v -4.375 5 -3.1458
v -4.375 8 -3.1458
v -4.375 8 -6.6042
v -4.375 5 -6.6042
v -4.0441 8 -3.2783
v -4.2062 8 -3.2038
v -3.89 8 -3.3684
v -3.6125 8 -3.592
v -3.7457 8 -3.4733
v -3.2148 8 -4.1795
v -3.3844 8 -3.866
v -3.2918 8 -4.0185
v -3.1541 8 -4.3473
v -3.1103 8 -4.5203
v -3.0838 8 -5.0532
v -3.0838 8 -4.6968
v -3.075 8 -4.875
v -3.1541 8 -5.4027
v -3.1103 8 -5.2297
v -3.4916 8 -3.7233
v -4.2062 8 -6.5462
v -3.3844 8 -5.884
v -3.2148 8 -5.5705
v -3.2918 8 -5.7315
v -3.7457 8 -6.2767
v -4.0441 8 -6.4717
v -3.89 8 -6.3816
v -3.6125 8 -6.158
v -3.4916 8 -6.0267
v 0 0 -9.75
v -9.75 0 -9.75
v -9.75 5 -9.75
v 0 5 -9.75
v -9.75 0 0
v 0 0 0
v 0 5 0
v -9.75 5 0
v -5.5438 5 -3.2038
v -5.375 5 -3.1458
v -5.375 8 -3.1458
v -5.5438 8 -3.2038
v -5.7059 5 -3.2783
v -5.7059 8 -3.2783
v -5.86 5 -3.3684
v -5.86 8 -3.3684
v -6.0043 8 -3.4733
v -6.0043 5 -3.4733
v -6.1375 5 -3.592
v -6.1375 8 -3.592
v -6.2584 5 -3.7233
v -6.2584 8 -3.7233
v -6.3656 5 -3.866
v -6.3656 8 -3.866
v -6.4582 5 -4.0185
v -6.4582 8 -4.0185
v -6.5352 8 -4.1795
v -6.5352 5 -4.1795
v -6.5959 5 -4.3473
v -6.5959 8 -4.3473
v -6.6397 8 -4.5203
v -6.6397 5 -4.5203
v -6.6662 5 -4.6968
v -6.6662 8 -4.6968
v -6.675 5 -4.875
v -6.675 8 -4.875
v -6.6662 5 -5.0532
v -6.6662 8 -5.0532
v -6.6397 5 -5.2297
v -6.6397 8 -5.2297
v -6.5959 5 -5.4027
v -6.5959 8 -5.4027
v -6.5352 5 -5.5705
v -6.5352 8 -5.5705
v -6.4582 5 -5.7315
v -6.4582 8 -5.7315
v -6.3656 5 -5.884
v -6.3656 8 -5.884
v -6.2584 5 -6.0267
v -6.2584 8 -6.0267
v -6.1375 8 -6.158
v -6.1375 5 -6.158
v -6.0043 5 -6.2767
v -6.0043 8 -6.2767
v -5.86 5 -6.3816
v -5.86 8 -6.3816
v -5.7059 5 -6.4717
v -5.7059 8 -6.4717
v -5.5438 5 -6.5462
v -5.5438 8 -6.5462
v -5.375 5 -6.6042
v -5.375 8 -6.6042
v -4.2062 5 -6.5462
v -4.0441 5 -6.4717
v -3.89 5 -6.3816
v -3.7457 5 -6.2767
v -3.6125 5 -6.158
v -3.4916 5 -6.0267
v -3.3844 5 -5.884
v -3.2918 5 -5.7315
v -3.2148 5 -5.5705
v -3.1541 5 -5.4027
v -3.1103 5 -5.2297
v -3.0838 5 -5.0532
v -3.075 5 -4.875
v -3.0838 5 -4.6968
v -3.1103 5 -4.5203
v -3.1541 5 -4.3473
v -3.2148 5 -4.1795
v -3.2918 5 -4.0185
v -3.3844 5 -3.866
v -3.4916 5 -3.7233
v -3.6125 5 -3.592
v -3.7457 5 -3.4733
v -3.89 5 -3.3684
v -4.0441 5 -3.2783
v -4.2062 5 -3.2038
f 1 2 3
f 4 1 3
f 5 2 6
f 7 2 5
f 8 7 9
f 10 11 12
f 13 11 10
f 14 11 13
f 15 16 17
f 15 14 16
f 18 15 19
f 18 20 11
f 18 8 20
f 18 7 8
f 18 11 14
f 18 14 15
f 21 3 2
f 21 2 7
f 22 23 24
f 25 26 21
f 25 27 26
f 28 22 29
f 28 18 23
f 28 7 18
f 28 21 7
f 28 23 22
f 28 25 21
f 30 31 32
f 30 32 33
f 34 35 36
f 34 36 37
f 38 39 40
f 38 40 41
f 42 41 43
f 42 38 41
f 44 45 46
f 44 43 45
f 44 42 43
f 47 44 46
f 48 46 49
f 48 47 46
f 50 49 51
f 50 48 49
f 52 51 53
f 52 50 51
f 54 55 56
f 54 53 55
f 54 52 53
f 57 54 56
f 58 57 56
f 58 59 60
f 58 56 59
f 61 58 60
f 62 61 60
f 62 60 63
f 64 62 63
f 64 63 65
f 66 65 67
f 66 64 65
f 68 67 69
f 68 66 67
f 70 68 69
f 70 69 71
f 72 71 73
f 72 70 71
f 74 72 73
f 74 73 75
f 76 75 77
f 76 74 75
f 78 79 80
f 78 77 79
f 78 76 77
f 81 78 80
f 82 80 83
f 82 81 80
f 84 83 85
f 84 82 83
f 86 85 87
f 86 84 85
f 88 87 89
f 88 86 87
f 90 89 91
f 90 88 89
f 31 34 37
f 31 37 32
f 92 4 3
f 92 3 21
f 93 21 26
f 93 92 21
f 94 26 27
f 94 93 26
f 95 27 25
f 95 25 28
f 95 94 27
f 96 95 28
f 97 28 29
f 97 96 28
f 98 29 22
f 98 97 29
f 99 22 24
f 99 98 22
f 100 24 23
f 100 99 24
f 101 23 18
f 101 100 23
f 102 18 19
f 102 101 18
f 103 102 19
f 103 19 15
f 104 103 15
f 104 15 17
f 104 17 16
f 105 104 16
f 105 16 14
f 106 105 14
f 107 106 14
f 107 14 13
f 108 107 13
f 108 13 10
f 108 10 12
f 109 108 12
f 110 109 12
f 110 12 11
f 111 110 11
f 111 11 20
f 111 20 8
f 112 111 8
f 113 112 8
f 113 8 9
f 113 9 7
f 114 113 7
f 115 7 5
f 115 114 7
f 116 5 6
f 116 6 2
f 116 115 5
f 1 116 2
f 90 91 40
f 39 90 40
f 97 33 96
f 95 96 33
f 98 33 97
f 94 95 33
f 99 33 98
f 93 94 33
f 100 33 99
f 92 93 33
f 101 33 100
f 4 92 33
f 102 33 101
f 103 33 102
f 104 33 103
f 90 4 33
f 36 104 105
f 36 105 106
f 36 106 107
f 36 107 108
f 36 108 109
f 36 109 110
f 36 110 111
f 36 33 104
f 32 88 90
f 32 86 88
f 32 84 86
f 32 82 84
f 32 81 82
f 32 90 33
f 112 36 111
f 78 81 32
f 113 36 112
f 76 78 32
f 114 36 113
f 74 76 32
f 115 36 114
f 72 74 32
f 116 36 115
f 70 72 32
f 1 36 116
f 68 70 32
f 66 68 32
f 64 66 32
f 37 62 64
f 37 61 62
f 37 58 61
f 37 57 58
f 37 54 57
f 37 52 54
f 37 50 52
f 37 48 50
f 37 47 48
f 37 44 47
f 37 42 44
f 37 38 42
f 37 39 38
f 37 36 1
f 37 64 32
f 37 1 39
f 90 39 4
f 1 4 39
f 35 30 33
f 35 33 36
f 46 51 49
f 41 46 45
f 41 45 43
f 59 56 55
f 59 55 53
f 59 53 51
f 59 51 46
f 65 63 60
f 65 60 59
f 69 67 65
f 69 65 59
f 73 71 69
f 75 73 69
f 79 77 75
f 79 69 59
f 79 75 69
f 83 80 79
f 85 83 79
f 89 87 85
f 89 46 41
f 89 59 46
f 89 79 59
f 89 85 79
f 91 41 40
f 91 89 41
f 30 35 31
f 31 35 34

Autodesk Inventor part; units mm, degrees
ref_plane "YZ Plane" through (0, 0, 0) normal (1, 0, 0) x (0, 1, 0)
ref_plane "XZ Plane" through (0, 0, 0) normal (0, 1, 0) x (-1, 0, 0)
ref_plane "XY Plane" through (0, 0, 0) normal (0, 0, 1) x (1, 0, 0)
sketch "Sketch1" plane through (0, 0, 0) normal (0, 1, 0) x (-1, 0, 0)
  line L0 (0, 0) -> (9.75, 0)
  line L1 (9.75, 0) -> (9.75, -9.75)
  line L2 (9.75, -9.75) -> (0, -9.75)
  line L3 (0, -9.75) -> (0, 0)
  dimension "d0" = 9.75
  dimension "d1" = 9.75
extrude "Extrusion1" add sketch "Sketch1" along normal blind 5
sketch "Sketch2" plane through (0, 5, 0) normal (0, 1, 0) x (1, 0, 0)
  line L0 (0, 9.75) -> (-9.75, 9.75) projected
  line L1 (-9.75, 9.75) -> (-9.75, 0) projected
  line L2 (-9.75, 0) -> (0, 0) projected
  line L3 (0, 0) -> (0, 9.75) projected
  circle A0 centre (-4.875, 4.875) radius 1.8
  dimension "d4" = 3.6
extrude "Extrusion2" add sketch "Sketch2" along normal blind 3 contours A0
sketch "Sketch3" plane through (-4.875, 8, -4.875) normal (0, 1, 0) x (1, 0, 0)
  circle A0 centre (0, 0) radius 1.8 projected
  line L0 (-0.5, -2.1786) -> (0.5, -2.1786)
  line L1 (0.5, -2.1786) -> (0.5, 2.1786)
  line L2 (0.5, 2.1786) -> (-0.5, 2.1786)
  line L3 (-0.5, 2.1786) -> (-0.5, -2.1786)
  line L4 (-0.5, -2.1786) -> (0.5, 2.1786) construction
  line L5 (0.5, -2.1786) -> (-0.5, 2.1786) construction
  point P0 (4.875, -4.875)
  point P1 (-0.5, 1.7292)
  point P2 (-0.5, -1.7292)
  point P3 (0.5, -1.7292)
  point P4 (0.5, 1.7292)
  dimension "d7" = 1
extrude "Extrusion3" cut sketch "Sketch3" against normal blind 3 contours L1 A0 L3
properties part number "Pot"
